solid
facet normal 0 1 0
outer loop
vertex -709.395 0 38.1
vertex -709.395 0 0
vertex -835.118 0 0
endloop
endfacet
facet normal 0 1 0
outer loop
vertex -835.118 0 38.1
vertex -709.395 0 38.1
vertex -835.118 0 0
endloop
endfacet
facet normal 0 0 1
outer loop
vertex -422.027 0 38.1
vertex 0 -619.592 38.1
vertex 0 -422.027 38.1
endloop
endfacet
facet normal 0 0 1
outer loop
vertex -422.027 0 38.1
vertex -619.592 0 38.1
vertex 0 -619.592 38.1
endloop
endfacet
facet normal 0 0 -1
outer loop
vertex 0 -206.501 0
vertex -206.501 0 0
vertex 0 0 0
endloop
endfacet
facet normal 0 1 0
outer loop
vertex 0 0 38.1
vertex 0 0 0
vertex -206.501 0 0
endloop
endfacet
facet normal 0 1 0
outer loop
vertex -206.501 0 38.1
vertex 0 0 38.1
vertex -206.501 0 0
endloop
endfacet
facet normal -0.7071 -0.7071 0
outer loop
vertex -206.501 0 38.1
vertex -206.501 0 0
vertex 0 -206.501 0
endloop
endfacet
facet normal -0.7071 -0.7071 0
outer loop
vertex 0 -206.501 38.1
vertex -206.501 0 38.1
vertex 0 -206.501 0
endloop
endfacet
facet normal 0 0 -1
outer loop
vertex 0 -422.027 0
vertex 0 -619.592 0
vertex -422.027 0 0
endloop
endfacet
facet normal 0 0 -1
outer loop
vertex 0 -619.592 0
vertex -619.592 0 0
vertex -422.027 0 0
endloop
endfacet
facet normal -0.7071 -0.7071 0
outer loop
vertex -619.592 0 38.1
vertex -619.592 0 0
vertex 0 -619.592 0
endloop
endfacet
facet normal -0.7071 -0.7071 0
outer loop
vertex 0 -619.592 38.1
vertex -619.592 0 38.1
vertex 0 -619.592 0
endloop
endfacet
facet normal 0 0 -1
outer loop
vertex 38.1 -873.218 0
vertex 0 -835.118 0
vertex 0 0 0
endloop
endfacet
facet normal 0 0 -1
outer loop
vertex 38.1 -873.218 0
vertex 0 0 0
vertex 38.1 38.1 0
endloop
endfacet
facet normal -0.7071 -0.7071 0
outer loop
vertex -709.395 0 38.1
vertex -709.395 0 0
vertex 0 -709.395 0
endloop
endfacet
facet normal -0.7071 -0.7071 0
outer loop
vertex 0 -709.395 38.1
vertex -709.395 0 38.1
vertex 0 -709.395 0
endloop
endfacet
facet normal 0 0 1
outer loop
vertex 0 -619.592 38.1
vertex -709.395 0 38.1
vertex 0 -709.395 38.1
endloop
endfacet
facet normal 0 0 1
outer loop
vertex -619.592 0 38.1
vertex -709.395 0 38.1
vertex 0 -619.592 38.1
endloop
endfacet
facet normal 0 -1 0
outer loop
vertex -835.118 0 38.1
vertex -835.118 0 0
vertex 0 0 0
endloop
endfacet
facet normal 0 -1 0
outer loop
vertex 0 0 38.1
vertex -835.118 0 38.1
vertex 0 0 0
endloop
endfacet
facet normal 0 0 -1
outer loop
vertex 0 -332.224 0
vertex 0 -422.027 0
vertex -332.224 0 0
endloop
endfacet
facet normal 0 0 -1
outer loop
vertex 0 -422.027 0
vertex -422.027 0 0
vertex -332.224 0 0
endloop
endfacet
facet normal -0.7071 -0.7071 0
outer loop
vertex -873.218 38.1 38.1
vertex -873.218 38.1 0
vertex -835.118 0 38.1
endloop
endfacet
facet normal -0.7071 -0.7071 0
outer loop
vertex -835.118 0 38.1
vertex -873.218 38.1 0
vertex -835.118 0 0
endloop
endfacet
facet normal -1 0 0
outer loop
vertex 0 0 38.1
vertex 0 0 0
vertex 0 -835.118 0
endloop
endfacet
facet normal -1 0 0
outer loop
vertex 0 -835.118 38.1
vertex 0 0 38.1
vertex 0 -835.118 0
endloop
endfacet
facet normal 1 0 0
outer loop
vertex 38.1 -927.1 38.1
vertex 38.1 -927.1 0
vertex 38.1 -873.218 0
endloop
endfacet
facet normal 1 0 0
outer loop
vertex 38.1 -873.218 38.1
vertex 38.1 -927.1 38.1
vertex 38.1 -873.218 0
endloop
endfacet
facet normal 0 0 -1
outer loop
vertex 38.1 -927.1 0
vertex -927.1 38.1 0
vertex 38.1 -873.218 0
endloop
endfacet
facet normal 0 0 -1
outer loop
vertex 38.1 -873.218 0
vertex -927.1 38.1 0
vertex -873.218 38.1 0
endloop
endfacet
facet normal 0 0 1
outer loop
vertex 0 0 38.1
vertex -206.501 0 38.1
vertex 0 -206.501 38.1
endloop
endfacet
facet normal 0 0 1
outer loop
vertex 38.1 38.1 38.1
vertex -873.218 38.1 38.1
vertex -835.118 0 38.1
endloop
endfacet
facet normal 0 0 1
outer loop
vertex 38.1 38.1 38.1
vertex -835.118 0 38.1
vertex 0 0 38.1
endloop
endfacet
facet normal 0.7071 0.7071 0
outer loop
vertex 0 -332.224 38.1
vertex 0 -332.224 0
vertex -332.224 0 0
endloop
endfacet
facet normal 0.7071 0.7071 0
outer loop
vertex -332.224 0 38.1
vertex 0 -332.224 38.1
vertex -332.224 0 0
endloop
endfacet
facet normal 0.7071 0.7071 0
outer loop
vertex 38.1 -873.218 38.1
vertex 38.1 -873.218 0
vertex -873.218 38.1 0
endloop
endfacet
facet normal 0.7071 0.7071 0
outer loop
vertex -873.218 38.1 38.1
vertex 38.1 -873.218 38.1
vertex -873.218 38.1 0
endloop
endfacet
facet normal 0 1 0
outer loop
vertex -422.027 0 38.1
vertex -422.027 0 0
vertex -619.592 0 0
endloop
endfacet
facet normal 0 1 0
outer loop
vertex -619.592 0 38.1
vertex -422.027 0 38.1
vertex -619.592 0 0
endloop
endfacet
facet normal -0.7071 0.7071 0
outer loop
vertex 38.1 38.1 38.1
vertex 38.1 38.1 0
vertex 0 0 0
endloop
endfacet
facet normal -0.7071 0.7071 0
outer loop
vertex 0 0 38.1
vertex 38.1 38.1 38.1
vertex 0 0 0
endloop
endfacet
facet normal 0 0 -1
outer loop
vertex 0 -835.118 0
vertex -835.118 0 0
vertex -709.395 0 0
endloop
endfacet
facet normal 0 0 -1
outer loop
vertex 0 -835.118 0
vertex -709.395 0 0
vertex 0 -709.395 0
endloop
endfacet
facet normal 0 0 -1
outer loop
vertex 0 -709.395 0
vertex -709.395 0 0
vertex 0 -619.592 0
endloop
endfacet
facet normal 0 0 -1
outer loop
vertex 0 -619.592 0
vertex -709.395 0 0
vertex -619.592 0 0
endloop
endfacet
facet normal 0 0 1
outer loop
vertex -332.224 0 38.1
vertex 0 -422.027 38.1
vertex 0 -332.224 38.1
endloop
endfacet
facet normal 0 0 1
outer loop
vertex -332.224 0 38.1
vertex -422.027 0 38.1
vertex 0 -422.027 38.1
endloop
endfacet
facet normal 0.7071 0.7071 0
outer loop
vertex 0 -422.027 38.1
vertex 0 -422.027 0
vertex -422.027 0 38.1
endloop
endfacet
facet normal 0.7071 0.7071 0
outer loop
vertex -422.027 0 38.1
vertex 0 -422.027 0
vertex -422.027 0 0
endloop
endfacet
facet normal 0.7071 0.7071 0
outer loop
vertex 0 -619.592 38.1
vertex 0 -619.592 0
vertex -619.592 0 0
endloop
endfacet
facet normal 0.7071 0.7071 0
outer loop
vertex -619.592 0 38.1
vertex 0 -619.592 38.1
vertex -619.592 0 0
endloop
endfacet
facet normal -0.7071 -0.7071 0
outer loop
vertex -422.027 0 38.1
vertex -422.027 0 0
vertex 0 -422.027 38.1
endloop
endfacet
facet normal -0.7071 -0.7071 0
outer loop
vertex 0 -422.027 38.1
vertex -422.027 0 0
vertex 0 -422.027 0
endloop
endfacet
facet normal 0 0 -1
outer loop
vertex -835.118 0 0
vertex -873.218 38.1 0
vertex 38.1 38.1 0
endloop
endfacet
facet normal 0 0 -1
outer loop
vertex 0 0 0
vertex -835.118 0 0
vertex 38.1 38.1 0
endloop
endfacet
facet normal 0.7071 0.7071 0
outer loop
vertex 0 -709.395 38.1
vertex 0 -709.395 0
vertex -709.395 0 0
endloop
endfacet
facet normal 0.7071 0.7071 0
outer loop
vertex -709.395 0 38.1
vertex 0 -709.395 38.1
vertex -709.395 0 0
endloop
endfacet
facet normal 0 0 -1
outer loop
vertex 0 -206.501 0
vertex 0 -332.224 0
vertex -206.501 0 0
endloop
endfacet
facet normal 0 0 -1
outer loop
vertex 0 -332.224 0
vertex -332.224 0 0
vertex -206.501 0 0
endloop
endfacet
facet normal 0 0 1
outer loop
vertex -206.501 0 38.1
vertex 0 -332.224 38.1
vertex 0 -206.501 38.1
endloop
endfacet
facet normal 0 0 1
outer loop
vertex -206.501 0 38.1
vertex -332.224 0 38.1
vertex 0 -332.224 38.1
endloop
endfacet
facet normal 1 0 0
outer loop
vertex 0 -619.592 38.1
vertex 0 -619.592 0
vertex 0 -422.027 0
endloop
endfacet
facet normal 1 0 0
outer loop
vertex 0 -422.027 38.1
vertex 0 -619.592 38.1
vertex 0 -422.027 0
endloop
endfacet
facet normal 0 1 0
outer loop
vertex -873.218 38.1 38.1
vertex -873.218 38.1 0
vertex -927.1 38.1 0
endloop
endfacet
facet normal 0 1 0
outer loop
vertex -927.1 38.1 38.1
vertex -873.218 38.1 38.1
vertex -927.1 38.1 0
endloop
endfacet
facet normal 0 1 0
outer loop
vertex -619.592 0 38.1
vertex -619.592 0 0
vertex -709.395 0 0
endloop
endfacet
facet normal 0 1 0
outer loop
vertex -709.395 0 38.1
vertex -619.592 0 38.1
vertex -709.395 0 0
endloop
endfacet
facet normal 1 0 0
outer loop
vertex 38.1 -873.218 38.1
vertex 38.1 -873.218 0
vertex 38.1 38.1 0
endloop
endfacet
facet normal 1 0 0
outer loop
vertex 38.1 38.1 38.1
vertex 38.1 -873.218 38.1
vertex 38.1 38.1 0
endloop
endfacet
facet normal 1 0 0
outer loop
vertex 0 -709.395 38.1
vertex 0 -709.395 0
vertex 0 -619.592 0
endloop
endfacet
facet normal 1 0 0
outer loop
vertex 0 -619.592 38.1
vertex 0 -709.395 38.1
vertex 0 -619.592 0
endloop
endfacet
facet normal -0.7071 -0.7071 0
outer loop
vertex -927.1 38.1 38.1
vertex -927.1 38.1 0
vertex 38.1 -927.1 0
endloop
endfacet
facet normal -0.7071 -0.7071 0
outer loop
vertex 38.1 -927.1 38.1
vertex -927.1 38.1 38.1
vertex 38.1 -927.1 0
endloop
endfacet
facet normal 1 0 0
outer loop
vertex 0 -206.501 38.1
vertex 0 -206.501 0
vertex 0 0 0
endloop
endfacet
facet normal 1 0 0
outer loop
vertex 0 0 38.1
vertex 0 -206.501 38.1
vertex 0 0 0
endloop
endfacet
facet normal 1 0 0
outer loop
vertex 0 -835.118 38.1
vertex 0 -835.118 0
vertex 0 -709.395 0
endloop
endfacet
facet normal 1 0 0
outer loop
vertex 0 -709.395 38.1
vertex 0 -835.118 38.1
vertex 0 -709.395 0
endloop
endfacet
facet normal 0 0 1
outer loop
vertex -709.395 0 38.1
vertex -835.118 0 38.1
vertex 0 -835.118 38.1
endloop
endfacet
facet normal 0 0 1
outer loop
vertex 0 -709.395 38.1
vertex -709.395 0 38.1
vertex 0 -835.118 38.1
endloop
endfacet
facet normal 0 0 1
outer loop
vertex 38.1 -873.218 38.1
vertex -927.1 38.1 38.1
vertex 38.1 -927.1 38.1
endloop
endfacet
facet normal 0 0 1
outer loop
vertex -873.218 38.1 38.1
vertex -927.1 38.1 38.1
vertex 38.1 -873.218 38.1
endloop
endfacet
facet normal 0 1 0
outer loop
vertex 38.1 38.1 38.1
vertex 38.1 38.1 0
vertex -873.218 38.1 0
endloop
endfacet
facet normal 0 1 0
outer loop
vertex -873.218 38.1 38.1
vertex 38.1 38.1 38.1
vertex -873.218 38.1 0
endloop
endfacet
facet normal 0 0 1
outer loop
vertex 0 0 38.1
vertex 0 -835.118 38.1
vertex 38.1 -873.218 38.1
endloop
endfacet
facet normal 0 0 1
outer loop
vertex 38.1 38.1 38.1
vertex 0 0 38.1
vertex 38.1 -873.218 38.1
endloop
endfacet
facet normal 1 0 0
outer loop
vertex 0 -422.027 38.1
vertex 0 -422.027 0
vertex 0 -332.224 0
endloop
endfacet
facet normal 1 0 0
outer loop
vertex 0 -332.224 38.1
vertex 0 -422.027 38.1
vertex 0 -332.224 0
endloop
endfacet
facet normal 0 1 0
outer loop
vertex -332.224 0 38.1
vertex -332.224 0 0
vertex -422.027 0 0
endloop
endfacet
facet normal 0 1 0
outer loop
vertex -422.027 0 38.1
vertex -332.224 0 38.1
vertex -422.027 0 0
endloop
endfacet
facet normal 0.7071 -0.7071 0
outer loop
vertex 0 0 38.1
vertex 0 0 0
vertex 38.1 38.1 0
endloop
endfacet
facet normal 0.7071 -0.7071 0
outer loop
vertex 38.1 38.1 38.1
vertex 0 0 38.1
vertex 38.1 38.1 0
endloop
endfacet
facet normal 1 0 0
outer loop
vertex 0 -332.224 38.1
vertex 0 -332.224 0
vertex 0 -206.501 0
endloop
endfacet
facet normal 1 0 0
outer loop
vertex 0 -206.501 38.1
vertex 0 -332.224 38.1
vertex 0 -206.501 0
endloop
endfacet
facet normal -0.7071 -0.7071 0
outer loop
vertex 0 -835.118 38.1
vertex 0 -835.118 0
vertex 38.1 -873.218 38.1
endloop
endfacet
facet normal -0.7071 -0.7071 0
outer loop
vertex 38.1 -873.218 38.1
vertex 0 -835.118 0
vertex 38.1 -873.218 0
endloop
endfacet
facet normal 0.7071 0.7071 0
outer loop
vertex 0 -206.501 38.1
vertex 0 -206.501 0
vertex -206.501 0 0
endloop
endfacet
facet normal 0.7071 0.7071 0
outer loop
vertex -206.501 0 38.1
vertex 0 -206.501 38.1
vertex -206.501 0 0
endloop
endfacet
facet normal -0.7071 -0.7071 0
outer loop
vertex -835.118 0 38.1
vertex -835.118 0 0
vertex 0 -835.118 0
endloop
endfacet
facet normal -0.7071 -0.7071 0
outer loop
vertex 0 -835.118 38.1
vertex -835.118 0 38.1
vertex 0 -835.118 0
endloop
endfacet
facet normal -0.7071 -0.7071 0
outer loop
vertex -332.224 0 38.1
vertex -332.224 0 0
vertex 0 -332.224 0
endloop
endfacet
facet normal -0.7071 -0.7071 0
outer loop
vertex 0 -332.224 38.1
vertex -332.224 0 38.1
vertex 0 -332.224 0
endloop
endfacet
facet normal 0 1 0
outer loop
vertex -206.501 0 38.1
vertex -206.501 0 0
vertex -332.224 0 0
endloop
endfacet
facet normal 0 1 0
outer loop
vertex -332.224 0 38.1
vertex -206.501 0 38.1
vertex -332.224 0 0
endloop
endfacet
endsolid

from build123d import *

# Parameters (mm, degrees)
F1_DEPTH = 38.1
F2_DEPTH = 38.1
F3_DEPTH = 38.1
F4_DEPTH = 38.1


with BuildPart() as f1:
    # F0 (on Top) → F1 (new body)
    with BuildSketch(Plane.XY):
        Polygon((38.1, -927.1), (38.1, -873.218463), (0, -835.118463), (-835.118463, 0), (-873.218463, 38.1), (-927.1, 38.1), (0, -889), align=None)
        Polygon((0, -709.394878), (0, -619.592316), (-619.592316, 0), (-709.394878, 0), align=None)
        Polygon((0, -422.026682), (0, -332.22412), (-332.22412, 0), (-422.026682, 0), align=None)
        Polygon((0, -206.500535), (0, 0), (-206.500535, 0), align=None)
    extrude(amount=F1_DEPTH)


with BuildPart() as f2:
    # F0 (on Top) → F2 (new body)
    with BuildSketch(Plane.XY):
        Polygon((-835.118463, 0), (0, -835.118463), (0, -709.394878), (-709.394878, 0), align=None)
        Polygon((0, -619.592316), (0, -422.026682), (-422.026682, 0), (-619.592316, 0), align=None)
        Polygon((0, -332.22412), (0, -206.500535), (-206.500535, 0), (-332.22412, 0), align=None)
    extrude(amount=F2_DEPTH)


with BuildPart() as f3:
    # F0 (on Top) → F3 (new body)
    with BuildSketch(Plane.XY):
        Polygon((-206.500535, 0), (0, 0), (38.1, 38.1), (-873.218463, 38.1), (-835.118463, 0), (-709.394878, 0), (-619.592316, 0), (-422.026682, 0), (-332.22412, 0), align=None)
    extrude(amount=F3_DEPTH)


with BuildPart() as f4:
    # F0 (on Top) → F4 (new body)
    with BuildSketch(Plane.XY):
        Polygon((38.1, 38.1), (0, 0), (0, -206.500535), (0, -332.22412), (0, -422.026682), (0, -619.592316), (0, -709.394878), (0, -835.118463), (38.1, -873.218463), align=None)
    extrude(amount=F4_DEPTH)


solid = Compound([f1.part, f2.part, f3.part, f4.part])
